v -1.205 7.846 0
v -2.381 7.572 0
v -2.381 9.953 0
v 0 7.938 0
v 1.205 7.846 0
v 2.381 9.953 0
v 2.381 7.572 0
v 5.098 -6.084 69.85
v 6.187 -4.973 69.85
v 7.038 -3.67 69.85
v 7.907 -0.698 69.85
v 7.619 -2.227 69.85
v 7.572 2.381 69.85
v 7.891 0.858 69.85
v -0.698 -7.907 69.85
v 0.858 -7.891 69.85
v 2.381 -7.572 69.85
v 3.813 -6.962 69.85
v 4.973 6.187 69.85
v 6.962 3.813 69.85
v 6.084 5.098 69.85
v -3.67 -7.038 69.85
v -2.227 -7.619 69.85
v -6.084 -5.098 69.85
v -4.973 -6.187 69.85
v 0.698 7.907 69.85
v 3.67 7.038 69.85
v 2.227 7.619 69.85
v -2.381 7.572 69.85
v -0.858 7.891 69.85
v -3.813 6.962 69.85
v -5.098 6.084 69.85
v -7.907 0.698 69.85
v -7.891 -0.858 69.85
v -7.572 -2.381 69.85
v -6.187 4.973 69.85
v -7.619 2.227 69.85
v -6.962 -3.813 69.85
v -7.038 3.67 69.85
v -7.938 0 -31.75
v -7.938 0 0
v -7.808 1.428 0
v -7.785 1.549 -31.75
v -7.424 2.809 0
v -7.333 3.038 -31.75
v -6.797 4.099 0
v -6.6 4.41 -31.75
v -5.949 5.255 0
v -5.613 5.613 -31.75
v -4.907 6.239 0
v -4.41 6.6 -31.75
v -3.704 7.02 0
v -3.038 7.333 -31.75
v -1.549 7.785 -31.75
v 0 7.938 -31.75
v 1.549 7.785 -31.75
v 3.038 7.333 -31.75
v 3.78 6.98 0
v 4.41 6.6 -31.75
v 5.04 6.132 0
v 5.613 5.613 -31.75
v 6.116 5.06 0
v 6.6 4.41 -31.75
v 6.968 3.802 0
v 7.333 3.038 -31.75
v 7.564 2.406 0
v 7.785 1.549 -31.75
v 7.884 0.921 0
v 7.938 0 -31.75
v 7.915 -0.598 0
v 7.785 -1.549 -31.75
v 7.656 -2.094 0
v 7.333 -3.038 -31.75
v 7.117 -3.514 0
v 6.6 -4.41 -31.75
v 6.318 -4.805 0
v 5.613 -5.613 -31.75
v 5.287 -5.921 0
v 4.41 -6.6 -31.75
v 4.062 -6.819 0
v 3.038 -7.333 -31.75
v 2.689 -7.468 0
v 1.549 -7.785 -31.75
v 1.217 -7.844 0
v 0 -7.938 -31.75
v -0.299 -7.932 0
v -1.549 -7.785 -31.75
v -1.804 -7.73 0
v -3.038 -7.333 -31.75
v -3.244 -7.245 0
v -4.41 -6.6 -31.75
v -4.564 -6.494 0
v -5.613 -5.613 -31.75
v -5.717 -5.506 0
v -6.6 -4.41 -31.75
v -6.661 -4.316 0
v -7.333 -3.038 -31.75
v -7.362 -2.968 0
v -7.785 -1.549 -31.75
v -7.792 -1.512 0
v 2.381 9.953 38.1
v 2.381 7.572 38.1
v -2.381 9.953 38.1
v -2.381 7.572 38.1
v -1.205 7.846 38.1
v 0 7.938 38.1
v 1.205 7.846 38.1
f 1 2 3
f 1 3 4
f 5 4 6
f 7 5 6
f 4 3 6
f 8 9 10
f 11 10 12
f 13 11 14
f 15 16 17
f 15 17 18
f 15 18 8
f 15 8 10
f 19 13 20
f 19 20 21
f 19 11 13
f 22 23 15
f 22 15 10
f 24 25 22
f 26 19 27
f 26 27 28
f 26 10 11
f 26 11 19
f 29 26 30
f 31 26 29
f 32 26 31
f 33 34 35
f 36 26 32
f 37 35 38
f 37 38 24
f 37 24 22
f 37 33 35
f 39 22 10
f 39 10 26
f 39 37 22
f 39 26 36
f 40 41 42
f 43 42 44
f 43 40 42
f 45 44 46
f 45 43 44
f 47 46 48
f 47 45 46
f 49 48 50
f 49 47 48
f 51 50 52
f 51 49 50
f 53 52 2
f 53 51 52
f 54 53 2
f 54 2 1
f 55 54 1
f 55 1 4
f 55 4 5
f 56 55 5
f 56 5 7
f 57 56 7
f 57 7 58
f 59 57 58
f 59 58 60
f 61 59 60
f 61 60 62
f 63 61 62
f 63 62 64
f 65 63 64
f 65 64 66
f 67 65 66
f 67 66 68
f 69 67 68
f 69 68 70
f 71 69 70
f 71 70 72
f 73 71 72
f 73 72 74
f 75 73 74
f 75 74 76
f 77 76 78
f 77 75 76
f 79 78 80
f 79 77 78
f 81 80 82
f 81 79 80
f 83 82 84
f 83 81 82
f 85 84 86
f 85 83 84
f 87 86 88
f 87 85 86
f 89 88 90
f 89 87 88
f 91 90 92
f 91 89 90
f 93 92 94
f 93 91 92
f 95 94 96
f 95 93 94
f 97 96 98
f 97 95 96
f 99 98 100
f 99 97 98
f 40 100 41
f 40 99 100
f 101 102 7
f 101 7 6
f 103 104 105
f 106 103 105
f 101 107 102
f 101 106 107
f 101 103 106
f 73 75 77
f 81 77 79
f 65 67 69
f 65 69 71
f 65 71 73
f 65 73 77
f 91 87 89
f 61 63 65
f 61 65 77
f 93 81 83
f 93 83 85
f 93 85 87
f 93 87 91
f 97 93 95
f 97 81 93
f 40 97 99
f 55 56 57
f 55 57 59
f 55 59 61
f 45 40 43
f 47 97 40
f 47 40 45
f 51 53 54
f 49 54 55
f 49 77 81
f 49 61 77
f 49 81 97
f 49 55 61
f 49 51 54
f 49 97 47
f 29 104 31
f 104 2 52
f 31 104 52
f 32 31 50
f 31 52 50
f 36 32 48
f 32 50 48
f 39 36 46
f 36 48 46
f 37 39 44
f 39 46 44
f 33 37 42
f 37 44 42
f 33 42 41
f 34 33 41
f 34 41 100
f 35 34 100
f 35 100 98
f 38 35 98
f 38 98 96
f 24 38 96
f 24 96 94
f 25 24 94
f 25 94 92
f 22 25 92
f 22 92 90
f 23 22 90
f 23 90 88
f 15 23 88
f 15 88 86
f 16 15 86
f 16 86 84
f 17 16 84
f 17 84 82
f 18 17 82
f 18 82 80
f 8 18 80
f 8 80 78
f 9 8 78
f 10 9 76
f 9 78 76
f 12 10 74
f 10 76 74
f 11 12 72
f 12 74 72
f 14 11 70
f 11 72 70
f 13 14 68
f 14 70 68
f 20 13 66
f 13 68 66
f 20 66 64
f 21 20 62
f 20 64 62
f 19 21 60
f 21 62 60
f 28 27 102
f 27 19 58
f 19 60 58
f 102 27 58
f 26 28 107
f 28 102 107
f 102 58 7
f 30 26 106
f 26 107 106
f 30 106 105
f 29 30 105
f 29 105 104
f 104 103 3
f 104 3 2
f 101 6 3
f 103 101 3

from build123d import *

# Parameters (mm, degrees)
BOSS_EXTRUDE1_DEPTH = 38.1
SKETCH2_R           = 7.9375
BOSS_EXTRUDE2_DEPTH = 31.75
BOSS_EXTRUDE3_START = 31.75
SKETCH3_R           = 7.9375
BOSS_EXTRUDE3_DEPTH = 31.75


with BuildPart() as part:
    # Sketch1 → Boss-Extrude1 (new body)
    with BuildSketch(Plane.XY):
        with BuildLine():
            Line((2.38125, 7.571892411), (2.38125, 9.953142411))
            Line((2.38125, 9.953142411), (-2.38125, 9.953142411))
            Line((-2.38125, 9.953142411), (-2.38125, 7.571892411))
            ThreePointArc((-2.38125, 7.571892411), (0, -7.9375), (2.38125, 7.571892411))
        make_face()
    extrude(amount=BOSS_EXTRUDE1_DEPTH)

    # Sketch2 → Boss-Extrude2 (add)
    with BuildSketch(Plane.XY.offset(38.1)):
        with Locations(Location((0, 0, 0), (0, 0, 107.457603124))):
            Circle(SKETCH2_R)
    extrude(amount=BOSS_EXTRUDE2_DEPTH)

    # Sketch3 → Boss-Extrude3 (add)
    with BuildSketch(Plane(origin=(0, 0, 0), x_dir=(-1, 0, 0), z_dir=(0, 0, -1)).offset(BOSS_EXTRUDE3_START)):
        Circle(SKETCH3_R)
    extrude(amount=-BOSS_EXTRUDE3_DEPTH)


solid = part.part
